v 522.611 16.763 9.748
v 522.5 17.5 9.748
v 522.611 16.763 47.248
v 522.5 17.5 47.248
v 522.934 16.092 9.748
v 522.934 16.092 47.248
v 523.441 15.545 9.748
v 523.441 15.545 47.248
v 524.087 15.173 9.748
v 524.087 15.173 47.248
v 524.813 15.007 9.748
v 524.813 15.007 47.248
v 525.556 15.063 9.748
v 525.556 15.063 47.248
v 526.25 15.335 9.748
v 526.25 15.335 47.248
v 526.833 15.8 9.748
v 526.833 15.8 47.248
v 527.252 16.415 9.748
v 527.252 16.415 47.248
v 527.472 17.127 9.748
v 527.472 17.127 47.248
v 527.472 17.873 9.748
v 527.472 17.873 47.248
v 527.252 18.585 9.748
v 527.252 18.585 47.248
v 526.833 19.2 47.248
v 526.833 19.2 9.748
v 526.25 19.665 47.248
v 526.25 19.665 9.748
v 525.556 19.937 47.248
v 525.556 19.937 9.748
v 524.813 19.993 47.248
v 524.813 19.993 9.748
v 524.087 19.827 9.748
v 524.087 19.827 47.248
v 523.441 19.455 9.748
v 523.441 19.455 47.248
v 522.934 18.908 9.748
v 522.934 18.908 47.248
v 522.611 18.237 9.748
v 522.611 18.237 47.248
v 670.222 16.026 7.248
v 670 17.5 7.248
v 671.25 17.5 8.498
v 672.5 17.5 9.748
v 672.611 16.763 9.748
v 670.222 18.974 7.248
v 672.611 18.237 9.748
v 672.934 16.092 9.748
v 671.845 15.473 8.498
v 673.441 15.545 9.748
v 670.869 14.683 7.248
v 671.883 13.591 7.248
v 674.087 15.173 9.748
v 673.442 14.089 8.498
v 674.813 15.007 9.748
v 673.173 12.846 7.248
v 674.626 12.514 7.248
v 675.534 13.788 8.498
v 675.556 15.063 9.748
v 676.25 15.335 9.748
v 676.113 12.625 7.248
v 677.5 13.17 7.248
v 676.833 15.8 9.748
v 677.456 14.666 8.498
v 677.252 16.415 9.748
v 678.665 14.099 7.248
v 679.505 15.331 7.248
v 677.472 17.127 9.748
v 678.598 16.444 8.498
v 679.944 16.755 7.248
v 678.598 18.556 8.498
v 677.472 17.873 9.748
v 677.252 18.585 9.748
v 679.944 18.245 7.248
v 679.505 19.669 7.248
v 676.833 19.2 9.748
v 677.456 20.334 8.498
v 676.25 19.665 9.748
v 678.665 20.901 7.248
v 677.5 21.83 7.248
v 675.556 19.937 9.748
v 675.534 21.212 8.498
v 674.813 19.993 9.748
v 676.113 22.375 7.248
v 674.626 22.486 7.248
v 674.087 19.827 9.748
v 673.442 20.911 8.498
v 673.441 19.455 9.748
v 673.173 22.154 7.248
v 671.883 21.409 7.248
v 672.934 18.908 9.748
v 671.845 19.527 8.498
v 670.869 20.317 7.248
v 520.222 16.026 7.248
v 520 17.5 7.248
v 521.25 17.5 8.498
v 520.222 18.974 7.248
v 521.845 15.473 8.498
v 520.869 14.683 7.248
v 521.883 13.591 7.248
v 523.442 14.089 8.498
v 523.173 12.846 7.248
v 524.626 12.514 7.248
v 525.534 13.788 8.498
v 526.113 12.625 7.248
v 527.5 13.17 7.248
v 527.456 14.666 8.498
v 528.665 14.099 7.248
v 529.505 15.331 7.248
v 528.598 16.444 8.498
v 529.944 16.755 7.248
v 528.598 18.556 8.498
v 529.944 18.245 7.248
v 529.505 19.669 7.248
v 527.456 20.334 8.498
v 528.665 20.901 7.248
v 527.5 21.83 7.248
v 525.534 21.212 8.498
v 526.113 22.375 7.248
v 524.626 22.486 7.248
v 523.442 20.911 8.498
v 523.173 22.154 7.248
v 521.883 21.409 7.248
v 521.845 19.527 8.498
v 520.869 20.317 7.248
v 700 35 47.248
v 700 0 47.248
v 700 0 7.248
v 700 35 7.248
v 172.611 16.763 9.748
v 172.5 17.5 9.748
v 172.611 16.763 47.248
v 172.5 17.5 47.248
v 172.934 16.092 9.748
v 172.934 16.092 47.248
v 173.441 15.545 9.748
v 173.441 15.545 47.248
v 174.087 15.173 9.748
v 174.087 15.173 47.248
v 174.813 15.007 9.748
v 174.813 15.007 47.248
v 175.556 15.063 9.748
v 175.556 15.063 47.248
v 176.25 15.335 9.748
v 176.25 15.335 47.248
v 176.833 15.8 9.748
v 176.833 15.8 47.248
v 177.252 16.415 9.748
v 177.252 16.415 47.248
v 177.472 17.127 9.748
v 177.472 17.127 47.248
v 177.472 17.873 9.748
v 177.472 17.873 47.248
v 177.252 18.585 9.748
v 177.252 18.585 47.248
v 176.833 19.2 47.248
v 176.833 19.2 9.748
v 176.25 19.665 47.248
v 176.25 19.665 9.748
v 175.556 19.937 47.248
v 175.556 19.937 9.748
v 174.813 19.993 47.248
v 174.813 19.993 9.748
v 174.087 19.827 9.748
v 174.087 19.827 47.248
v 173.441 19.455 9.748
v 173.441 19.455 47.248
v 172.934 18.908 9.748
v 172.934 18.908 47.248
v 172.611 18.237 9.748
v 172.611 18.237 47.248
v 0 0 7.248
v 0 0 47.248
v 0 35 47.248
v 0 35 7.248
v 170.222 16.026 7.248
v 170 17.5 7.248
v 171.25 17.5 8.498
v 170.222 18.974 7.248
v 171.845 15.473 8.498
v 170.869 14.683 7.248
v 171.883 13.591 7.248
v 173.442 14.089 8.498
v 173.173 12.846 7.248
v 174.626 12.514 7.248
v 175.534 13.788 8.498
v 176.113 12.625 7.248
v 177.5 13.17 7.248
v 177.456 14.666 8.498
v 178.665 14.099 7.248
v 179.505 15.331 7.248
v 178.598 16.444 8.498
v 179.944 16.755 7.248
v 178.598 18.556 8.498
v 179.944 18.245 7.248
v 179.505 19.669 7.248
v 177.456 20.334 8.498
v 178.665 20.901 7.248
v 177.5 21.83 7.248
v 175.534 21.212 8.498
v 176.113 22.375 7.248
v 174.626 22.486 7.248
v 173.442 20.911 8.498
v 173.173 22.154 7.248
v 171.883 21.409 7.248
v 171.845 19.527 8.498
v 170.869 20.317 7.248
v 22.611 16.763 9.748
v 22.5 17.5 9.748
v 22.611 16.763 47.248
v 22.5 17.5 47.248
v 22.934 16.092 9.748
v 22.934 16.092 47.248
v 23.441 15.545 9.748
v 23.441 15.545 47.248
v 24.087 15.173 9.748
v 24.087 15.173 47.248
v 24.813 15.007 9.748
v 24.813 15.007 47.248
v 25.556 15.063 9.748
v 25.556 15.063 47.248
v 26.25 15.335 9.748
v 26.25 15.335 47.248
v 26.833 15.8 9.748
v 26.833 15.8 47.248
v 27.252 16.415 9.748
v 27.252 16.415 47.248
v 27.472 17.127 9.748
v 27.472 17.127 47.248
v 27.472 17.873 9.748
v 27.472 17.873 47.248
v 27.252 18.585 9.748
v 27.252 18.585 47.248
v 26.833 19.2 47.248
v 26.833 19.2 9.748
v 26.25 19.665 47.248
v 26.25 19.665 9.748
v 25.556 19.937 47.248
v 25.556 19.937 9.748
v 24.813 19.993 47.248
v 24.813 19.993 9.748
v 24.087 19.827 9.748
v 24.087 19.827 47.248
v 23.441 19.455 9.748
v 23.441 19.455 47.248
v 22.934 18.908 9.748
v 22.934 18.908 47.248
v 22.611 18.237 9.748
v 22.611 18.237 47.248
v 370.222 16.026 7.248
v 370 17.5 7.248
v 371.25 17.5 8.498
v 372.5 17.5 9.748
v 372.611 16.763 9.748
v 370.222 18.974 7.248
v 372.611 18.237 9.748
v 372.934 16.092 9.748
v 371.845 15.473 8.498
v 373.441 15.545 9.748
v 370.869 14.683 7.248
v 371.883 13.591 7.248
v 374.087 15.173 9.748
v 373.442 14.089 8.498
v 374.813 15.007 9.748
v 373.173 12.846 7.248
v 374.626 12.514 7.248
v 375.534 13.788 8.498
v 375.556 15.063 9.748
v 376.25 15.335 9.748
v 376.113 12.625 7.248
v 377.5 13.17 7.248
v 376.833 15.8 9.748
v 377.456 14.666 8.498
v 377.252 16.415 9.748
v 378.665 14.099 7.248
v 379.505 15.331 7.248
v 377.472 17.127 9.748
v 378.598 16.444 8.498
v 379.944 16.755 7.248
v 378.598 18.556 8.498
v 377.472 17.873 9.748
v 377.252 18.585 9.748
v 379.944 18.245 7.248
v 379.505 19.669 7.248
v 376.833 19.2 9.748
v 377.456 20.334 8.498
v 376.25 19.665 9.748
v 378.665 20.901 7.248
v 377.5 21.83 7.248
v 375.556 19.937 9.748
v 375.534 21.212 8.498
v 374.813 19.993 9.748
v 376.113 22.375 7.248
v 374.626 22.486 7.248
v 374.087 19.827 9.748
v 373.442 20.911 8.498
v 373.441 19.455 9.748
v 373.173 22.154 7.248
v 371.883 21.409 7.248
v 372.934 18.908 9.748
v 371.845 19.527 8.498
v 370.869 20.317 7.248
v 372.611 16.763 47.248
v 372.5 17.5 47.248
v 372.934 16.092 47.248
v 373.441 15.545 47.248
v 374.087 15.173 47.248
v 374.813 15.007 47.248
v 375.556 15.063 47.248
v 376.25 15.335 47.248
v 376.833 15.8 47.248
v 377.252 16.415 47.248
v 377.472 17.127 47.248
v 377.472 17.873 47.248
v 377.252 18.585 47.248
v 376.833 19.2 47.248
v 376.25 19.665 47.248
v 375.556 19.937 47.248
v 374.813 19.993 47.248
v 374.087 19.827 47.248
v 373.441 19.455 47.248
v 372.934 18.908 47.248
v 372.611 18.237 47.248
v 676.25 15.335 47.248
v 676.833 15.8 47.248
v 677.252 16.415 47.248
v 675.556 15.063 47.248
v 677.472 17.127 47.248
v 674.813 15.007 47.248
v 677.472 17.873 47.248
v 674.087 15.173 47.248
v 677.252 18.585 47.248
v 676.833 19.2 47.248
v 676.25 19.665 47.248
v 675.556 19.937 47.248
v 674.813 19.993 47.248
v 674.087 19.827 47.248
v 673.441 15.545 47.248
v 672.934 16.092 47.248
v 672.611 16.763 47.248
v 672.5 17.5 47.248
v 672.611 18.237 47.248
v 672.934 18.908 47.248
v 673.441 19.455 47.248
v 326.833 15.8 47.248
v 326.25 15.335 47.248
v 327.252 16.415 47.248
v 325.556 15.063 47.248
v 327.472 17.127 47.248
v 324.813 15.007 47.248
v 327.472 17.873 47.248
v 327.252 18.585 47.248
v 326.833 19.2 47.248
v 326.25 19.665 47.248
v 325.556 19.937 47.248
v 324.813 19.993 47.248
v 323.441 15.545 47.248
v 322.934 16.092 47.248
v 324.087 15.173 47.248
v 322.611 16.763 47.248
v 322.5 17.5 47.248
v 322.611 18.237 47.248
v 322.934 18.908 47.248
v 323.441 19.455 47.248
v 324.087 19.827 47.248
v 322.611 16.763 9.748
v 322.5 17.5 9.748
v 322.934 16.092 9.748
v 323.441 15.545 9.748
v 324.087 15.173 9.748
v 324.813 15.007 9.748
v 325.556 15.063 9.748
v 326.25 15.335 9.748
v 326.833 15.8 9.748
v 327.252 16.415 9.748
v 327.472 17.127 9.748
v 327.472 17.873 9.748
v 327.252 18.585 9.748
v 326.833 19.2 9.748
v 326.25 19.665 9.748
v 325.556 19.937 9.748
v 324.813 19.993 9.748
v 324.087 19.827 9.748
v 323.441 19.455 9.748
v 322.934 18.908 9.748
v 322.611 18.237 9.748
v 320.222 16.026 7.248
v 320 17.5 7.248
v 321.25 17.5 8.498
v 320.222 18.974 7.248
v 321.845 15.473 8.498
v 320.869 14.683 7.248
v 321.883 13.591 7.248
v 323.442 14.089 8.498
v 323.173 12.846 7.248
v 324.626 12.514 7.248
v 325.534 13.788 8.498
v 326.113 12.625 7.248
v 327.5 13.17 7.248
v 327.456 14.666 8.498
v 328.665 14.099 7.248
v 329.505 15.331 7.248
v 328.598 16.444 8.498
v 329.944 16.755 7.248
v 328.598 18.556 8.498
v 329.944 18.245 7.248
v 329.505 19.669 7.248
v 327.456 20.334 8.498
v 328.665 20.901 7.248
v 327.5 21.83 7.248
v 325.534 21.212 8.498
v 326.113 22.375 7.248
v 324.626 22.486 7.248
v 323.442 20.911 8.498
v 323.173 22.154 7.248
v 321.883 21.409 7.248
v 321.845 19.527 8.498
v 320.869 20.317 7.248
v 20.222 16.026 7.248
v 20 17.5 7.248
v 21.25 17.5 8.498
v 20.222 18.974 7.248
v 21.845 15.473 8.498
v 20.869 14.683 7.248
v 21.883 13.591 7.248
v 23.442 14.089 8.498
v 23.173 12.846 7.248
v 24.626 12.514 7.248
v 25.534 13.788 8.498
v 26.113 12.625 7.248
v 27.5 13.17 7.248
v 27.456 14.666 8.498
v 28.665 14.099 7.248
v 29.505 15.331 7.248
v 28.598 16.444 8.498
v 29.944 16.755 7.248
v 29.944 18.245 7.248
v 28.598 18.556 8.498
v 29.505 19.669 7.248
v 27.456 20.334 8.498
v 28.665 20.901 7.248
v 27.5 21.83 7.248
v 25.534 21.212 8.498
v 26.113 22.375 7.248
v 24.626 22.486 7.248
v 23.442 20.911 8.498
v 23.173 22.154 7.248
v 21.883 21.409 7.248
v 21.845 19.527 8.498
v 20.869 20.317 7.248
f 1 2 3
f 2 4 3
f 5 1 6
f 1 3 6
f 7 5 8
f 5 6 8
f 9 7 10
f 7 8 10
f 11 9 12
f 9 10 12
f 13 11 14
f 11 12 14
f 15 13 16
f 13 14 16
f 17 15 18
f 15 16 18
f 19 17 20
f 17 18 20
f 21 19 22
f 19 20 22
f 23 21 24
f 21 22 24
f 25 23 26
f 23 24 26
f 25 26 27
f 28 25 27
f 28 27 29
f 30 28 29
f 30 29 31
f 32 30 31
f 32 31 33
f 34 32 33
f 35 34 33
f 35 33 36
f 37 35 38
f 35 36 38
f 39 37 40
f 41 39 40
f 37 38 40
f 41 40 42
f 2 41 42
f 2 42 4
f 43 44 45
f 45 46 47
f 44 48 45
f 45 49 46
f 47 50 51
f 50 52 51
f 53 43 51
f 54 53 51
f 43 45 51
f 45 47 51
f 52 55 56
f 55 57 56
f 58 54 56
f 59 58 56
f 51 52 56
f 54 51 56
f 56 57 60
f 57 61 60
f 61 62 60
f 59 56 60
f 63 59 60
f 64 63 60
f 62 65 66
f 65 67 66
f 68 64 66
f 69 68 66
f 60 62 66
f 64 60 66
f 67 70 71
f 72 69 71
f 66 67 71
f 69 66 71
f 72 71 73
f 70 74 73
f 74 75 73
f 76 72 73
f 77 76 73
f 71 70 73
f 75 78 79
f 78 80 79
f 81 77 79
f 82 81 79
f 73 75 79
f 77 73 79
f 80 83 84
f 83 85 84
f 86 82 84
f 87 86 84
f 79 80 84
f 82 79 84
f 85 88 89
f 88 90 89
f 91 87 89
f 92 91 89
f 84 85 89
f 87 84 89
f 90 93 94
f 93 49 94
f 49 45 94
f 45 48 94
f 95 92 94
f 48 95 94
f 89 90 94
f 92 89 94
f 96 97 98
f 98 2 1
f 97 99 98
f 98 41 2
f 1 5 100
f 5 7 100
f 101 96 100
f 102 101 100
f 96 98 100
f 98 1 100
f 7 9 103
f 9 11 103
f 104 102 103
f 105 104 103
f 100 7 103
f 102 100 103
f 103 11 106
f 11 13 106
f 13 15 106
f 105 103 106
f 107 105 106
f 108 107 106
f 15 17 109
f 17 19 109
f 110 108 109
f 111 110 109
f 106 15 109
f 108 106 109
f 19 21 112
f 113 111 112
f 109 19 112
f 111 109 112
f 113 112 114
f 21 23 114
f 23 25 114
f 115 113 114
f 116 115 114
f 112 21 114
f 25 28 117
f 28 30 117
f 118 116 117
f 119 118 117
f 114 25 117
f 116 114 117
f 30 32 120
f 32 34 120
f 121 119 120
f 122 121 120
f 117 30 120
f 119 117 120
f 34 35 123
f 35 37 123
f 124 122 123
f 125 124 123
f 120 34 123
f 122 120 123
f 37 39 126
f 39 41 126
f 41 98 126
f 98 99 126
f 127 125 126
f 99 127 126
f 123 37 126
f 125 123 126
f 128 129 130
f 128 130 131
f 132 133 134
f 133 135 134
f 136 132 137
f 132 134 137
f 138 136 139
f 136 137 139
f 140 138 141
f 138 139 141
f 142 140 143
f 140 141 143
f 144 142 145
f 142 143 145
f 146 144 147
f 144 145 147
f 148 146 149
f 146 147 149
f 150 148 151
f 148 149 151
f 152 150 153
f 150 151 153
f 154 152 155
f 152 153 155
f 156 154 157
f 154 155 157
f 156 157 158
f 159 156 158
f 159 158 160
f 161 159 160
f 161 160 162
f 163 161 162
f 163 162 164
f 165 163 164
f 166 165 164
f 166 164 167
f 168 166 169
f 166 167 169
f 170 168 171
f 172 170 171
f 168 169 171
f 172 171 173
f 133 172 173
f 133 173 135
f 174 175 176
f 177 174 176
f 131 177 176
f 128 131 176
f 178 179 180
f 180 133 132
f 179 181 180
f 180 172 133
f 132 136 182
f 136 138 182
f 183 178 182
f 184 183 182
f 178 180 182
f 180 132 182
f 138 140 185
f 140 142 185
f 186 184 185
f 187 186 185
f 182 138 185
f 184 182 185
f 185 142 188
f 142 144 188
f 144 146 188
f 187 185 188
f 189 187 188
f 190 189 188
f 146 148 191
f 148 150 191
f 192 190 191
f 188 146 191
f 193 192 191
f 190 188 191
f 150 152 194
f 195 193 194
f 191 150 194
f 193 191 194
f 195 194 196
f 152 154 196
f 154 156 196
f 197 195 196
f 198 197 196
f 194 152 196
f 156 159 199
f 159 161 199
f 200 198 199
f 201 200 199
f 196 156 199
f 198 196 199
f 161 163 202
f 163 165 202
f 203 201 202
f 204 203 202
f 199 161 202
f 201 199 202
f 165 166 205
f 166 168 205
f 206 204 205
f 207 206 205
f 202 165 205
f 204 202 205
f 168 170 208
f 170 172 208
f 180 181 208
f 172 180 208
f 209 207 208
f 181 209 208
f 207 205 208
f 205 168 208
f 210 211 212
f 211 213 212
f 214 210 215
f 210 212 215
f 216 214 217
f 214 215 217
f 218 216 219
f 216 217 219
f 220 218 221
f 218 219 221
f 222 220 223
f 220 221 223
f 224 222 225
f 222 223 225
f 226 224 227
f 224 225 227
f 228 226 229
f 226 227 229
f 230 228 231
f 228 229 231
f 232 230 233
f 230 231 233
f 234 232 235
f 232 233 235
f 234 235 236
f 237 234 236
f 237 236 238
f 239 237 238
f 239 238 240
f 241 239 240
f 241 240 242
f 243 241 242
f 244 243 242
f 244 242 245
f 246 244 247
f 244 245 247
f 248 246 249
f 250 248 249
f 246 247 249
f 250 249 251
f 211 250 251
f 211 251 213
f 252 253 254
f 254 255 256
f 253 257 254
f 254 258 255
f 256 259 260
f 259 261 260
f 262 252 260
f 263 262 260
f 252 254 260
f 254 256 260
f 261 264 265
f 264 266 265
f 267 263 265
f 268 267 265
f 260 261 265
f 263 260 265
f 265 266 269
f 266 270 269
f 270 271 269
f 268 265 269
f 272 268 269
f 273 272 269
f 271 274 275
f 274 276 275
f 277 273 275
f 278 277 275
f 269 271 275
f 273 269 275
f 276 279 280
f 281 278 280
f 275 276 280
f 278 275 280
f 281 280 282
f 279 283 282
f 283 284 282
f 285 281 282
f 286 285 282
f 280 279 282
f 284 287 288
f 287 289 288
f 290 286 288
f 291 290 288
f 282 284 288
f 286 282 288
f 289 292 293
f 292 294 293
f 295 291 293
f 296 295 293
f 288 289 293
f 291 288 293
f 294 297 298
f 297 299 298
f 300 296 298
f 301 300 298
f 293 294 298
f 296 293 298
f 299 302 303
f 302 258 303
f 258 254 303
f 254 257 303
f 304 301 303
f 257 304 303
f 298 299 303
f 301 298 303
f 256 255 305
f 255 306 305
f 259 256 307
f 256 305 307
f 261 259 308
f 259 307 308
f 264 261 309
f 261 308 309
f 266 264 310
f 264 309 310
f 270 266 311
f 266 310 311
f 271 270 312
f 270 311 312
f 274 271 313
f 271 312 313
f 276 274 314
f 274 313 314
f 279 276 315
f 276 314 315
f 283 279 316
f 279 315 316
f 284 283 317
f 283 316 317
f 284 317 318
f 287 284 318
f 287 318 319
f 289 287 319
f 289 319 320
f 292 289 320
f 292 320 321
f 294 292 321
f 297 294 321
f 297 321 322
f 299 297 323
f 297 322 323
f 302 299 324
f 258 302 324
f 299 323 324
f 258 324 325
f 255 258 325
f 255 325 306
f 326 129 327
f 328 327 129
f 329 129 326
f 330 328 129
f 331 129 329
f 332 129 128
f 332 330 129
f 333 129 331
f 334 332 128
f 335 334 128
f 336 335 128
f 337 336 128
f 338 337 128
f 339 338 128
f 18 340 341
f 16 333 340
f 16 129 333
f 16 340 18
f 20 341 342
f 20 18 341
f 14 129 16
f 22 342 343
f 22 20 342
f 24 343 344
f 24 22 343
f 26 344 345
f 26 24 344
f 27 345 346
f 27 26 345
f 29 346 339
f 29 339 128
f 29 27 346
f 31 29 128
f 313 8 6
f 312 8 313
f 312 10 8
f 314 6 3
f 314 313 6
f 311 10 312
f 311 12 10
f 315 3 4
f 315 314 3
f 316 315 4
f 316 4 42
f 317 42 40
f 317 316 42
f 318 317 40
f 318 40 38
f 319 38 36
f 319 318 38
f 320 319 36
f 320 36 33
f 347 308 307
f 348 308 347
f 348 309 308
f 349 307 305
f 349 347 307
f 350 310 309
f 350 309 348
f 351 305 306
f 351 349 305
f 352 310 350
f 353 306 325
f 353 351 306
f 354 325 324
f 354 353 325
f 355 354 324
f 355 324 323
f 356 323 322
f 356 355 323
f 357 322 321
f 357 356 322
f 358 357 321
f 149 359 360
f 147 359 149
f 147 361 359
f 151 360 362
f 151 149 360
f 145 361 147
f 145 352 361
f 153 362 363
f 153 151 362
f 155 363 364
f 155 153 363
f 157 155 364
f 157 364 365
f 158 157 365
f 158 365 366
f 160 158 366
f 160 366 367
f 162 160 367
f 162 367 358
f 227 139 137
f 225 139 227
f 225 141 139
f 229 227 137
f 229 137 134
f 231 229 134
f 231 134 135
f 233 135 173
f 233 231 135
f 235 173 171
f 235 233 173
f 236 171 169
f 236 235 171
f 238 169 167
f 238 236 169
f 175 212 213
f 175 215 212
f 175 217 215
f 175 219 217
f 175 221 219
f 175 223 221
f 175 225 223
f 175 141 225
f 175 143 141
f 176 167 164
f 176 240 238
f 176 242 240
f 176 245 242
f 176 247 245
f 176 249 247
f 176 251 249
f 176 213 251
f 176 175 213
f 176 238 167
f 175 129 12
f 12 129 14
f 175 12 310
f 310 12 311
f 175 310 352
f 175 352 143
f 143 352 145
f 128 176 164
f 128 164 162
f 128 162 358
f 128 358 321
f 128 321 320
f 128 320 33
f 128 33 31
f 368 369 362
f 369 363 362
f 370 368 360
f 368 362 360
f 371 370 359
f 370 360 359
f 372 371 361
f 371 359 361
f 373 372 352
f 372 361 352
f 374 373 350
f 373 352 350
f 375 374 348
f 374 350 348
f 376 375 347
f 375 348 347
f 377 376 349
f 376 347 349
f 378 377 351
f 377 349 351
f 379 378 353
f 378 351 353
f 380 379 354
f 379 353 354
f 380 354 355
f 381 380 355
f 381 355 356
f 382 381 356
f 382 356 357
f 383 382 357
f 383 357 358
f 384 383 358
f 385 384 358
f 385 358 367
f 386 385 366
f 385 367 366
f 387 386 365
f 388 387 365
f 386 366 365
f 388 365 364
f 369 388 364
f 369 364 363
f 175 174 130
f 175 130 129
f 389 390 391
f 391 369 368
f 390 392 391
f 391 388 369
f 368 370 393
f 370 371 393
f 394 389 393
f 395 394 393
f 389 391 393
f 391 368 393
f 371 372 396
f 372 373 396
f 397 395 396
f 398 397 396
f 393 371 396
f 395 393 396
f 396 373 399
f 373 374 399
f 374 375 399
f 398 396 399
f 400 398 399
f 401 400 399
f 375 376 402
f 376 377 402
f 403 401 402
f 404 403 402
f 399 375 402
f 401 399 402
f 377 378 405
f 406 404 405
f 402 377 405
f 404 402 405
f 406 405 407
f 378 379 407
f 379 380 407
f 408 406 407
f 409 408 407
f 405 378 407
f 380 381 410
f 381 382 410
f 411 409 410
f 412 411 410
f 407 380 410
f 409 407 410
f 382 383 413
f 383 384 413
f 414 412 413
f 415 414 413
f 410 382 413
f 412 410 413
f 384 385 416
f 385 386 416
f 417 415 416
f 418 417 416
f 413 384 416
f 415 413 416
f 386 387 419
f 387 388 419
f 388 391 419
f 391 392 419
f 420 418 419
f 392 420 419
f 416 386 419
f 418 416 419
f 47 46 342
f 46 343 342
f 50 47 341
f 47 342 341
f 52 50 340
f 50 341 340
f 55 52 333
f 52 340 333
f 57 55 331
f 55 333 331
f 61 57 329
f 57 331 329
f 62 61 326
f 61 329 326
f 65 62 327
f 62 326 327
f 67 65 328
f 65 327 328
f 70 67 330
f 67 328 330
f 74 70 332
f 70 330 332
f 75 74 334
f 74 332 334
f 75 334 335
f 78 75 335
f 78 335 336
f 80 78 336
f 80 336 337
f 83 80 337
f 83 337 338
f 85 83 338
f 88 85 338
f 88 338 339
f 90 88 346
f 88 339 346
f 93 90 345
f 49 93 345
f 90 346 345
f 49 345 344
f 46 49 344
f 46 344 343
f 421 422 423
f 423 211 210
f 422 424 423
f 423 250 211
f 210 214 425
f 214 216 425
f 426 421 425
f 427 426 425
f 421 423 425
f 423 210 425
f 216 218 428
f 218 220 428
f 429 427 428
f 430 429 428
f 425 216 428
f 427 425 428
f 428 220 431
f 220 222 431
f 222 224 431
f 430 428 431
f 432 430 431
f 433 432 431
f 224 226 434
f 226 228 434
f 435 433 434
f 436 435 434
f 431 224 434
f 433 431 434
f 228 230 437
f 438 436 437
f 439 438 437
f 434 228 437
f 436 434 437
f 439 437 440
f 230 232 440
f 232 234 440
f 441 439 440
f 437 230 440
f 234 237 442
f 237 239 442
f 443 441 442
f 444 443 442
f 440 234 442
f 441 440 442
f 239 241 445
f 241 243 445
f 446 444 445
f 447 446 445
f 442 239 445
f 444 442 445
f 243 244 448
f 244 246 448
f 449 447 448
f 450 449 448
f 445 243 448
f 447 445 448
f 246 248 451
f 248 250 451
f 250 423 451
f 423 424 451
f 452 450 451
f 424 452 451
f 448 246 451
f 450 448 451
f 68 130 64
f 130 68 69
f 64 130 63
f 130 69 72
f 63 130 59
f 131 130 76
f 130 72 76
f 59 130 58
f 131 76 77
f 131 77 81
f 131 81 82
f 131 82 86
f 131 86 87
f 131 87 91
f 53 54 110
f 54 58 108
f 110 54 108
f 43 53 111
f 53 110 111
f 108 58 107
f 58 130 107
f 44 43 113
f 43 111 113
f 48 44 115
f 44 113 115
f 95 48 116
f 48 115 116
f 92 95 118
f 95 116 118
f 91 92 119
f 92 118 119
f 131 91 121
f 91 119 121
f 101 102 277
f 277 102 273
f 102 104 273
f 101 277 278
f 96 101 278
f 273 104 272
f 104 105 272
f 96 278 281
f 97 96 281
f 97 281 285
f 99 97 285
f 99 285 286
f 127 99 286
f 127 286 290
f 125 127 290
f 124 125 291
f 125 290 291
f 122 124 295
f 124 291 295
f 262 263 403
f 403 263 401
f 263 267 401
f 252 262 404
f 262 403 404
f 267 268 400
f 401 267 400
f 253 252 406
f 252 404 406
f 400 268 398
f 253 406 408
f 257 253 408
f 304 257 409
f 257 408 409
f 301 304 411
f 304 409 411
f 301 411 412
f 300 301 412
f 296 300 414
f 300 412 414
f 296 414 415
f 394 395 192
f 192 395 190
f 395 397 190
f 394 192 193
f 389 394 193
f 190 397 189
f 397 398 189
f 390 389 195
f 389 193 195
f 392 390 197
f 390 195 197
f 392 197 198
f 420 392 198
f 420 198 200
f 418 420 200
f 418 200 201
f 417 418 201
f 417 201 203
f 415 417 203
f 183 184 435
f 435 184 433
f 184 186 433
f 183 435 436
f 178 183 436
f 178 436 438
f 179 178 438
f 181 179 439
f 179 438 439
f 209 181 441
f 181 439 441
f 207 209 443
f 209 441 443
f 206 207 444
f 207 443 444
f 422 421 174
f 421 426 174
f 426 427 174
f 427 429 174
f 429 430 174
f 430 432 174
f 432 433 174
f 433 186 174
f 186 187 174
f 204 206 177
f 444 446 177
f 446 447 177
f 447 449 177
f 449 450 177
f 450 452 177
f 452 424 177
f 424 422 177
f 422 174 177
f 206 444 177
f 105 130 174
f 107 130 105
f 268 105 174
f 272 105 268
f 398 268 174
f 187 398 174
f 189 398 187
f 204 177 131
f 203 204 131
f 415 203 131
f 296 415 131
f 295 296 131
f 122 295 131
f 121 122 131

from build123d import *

# Parameters (mm, degrees)
F0_W           = 35
F0_H           = 40
F1_DEPTH       = 700
F3_D           = 5
F3_CSINK_D     = 10
F3_CSINK_ANGLE = 90


with BuildPart() as f1:
    # F0 (on Right) → F1 (new body)
    with BuildSketch(Plane.YZ):
        with Locations((17.5, 27.248142)):
            Rectangle(F0_W, F0_H)
    extrude(amount=F1_DEPTH)

    # F3 (through all)
    with Locations(Plane(origin=(0, 0, 7.248142), x_dir=(1, 0, 0), z_dir=(0, 0, -1))):
        with Locations((25, -17.5), (175, -17.5), (325, -17.5), (375, -17.5), (675, -17.5), (525, -17.5)):
            CounterSinkHole(F3_D / 2, F3_CSINK_D / 2, counter_sink_angle=F3_CSINK_ANGLE)


solid = f1.part
